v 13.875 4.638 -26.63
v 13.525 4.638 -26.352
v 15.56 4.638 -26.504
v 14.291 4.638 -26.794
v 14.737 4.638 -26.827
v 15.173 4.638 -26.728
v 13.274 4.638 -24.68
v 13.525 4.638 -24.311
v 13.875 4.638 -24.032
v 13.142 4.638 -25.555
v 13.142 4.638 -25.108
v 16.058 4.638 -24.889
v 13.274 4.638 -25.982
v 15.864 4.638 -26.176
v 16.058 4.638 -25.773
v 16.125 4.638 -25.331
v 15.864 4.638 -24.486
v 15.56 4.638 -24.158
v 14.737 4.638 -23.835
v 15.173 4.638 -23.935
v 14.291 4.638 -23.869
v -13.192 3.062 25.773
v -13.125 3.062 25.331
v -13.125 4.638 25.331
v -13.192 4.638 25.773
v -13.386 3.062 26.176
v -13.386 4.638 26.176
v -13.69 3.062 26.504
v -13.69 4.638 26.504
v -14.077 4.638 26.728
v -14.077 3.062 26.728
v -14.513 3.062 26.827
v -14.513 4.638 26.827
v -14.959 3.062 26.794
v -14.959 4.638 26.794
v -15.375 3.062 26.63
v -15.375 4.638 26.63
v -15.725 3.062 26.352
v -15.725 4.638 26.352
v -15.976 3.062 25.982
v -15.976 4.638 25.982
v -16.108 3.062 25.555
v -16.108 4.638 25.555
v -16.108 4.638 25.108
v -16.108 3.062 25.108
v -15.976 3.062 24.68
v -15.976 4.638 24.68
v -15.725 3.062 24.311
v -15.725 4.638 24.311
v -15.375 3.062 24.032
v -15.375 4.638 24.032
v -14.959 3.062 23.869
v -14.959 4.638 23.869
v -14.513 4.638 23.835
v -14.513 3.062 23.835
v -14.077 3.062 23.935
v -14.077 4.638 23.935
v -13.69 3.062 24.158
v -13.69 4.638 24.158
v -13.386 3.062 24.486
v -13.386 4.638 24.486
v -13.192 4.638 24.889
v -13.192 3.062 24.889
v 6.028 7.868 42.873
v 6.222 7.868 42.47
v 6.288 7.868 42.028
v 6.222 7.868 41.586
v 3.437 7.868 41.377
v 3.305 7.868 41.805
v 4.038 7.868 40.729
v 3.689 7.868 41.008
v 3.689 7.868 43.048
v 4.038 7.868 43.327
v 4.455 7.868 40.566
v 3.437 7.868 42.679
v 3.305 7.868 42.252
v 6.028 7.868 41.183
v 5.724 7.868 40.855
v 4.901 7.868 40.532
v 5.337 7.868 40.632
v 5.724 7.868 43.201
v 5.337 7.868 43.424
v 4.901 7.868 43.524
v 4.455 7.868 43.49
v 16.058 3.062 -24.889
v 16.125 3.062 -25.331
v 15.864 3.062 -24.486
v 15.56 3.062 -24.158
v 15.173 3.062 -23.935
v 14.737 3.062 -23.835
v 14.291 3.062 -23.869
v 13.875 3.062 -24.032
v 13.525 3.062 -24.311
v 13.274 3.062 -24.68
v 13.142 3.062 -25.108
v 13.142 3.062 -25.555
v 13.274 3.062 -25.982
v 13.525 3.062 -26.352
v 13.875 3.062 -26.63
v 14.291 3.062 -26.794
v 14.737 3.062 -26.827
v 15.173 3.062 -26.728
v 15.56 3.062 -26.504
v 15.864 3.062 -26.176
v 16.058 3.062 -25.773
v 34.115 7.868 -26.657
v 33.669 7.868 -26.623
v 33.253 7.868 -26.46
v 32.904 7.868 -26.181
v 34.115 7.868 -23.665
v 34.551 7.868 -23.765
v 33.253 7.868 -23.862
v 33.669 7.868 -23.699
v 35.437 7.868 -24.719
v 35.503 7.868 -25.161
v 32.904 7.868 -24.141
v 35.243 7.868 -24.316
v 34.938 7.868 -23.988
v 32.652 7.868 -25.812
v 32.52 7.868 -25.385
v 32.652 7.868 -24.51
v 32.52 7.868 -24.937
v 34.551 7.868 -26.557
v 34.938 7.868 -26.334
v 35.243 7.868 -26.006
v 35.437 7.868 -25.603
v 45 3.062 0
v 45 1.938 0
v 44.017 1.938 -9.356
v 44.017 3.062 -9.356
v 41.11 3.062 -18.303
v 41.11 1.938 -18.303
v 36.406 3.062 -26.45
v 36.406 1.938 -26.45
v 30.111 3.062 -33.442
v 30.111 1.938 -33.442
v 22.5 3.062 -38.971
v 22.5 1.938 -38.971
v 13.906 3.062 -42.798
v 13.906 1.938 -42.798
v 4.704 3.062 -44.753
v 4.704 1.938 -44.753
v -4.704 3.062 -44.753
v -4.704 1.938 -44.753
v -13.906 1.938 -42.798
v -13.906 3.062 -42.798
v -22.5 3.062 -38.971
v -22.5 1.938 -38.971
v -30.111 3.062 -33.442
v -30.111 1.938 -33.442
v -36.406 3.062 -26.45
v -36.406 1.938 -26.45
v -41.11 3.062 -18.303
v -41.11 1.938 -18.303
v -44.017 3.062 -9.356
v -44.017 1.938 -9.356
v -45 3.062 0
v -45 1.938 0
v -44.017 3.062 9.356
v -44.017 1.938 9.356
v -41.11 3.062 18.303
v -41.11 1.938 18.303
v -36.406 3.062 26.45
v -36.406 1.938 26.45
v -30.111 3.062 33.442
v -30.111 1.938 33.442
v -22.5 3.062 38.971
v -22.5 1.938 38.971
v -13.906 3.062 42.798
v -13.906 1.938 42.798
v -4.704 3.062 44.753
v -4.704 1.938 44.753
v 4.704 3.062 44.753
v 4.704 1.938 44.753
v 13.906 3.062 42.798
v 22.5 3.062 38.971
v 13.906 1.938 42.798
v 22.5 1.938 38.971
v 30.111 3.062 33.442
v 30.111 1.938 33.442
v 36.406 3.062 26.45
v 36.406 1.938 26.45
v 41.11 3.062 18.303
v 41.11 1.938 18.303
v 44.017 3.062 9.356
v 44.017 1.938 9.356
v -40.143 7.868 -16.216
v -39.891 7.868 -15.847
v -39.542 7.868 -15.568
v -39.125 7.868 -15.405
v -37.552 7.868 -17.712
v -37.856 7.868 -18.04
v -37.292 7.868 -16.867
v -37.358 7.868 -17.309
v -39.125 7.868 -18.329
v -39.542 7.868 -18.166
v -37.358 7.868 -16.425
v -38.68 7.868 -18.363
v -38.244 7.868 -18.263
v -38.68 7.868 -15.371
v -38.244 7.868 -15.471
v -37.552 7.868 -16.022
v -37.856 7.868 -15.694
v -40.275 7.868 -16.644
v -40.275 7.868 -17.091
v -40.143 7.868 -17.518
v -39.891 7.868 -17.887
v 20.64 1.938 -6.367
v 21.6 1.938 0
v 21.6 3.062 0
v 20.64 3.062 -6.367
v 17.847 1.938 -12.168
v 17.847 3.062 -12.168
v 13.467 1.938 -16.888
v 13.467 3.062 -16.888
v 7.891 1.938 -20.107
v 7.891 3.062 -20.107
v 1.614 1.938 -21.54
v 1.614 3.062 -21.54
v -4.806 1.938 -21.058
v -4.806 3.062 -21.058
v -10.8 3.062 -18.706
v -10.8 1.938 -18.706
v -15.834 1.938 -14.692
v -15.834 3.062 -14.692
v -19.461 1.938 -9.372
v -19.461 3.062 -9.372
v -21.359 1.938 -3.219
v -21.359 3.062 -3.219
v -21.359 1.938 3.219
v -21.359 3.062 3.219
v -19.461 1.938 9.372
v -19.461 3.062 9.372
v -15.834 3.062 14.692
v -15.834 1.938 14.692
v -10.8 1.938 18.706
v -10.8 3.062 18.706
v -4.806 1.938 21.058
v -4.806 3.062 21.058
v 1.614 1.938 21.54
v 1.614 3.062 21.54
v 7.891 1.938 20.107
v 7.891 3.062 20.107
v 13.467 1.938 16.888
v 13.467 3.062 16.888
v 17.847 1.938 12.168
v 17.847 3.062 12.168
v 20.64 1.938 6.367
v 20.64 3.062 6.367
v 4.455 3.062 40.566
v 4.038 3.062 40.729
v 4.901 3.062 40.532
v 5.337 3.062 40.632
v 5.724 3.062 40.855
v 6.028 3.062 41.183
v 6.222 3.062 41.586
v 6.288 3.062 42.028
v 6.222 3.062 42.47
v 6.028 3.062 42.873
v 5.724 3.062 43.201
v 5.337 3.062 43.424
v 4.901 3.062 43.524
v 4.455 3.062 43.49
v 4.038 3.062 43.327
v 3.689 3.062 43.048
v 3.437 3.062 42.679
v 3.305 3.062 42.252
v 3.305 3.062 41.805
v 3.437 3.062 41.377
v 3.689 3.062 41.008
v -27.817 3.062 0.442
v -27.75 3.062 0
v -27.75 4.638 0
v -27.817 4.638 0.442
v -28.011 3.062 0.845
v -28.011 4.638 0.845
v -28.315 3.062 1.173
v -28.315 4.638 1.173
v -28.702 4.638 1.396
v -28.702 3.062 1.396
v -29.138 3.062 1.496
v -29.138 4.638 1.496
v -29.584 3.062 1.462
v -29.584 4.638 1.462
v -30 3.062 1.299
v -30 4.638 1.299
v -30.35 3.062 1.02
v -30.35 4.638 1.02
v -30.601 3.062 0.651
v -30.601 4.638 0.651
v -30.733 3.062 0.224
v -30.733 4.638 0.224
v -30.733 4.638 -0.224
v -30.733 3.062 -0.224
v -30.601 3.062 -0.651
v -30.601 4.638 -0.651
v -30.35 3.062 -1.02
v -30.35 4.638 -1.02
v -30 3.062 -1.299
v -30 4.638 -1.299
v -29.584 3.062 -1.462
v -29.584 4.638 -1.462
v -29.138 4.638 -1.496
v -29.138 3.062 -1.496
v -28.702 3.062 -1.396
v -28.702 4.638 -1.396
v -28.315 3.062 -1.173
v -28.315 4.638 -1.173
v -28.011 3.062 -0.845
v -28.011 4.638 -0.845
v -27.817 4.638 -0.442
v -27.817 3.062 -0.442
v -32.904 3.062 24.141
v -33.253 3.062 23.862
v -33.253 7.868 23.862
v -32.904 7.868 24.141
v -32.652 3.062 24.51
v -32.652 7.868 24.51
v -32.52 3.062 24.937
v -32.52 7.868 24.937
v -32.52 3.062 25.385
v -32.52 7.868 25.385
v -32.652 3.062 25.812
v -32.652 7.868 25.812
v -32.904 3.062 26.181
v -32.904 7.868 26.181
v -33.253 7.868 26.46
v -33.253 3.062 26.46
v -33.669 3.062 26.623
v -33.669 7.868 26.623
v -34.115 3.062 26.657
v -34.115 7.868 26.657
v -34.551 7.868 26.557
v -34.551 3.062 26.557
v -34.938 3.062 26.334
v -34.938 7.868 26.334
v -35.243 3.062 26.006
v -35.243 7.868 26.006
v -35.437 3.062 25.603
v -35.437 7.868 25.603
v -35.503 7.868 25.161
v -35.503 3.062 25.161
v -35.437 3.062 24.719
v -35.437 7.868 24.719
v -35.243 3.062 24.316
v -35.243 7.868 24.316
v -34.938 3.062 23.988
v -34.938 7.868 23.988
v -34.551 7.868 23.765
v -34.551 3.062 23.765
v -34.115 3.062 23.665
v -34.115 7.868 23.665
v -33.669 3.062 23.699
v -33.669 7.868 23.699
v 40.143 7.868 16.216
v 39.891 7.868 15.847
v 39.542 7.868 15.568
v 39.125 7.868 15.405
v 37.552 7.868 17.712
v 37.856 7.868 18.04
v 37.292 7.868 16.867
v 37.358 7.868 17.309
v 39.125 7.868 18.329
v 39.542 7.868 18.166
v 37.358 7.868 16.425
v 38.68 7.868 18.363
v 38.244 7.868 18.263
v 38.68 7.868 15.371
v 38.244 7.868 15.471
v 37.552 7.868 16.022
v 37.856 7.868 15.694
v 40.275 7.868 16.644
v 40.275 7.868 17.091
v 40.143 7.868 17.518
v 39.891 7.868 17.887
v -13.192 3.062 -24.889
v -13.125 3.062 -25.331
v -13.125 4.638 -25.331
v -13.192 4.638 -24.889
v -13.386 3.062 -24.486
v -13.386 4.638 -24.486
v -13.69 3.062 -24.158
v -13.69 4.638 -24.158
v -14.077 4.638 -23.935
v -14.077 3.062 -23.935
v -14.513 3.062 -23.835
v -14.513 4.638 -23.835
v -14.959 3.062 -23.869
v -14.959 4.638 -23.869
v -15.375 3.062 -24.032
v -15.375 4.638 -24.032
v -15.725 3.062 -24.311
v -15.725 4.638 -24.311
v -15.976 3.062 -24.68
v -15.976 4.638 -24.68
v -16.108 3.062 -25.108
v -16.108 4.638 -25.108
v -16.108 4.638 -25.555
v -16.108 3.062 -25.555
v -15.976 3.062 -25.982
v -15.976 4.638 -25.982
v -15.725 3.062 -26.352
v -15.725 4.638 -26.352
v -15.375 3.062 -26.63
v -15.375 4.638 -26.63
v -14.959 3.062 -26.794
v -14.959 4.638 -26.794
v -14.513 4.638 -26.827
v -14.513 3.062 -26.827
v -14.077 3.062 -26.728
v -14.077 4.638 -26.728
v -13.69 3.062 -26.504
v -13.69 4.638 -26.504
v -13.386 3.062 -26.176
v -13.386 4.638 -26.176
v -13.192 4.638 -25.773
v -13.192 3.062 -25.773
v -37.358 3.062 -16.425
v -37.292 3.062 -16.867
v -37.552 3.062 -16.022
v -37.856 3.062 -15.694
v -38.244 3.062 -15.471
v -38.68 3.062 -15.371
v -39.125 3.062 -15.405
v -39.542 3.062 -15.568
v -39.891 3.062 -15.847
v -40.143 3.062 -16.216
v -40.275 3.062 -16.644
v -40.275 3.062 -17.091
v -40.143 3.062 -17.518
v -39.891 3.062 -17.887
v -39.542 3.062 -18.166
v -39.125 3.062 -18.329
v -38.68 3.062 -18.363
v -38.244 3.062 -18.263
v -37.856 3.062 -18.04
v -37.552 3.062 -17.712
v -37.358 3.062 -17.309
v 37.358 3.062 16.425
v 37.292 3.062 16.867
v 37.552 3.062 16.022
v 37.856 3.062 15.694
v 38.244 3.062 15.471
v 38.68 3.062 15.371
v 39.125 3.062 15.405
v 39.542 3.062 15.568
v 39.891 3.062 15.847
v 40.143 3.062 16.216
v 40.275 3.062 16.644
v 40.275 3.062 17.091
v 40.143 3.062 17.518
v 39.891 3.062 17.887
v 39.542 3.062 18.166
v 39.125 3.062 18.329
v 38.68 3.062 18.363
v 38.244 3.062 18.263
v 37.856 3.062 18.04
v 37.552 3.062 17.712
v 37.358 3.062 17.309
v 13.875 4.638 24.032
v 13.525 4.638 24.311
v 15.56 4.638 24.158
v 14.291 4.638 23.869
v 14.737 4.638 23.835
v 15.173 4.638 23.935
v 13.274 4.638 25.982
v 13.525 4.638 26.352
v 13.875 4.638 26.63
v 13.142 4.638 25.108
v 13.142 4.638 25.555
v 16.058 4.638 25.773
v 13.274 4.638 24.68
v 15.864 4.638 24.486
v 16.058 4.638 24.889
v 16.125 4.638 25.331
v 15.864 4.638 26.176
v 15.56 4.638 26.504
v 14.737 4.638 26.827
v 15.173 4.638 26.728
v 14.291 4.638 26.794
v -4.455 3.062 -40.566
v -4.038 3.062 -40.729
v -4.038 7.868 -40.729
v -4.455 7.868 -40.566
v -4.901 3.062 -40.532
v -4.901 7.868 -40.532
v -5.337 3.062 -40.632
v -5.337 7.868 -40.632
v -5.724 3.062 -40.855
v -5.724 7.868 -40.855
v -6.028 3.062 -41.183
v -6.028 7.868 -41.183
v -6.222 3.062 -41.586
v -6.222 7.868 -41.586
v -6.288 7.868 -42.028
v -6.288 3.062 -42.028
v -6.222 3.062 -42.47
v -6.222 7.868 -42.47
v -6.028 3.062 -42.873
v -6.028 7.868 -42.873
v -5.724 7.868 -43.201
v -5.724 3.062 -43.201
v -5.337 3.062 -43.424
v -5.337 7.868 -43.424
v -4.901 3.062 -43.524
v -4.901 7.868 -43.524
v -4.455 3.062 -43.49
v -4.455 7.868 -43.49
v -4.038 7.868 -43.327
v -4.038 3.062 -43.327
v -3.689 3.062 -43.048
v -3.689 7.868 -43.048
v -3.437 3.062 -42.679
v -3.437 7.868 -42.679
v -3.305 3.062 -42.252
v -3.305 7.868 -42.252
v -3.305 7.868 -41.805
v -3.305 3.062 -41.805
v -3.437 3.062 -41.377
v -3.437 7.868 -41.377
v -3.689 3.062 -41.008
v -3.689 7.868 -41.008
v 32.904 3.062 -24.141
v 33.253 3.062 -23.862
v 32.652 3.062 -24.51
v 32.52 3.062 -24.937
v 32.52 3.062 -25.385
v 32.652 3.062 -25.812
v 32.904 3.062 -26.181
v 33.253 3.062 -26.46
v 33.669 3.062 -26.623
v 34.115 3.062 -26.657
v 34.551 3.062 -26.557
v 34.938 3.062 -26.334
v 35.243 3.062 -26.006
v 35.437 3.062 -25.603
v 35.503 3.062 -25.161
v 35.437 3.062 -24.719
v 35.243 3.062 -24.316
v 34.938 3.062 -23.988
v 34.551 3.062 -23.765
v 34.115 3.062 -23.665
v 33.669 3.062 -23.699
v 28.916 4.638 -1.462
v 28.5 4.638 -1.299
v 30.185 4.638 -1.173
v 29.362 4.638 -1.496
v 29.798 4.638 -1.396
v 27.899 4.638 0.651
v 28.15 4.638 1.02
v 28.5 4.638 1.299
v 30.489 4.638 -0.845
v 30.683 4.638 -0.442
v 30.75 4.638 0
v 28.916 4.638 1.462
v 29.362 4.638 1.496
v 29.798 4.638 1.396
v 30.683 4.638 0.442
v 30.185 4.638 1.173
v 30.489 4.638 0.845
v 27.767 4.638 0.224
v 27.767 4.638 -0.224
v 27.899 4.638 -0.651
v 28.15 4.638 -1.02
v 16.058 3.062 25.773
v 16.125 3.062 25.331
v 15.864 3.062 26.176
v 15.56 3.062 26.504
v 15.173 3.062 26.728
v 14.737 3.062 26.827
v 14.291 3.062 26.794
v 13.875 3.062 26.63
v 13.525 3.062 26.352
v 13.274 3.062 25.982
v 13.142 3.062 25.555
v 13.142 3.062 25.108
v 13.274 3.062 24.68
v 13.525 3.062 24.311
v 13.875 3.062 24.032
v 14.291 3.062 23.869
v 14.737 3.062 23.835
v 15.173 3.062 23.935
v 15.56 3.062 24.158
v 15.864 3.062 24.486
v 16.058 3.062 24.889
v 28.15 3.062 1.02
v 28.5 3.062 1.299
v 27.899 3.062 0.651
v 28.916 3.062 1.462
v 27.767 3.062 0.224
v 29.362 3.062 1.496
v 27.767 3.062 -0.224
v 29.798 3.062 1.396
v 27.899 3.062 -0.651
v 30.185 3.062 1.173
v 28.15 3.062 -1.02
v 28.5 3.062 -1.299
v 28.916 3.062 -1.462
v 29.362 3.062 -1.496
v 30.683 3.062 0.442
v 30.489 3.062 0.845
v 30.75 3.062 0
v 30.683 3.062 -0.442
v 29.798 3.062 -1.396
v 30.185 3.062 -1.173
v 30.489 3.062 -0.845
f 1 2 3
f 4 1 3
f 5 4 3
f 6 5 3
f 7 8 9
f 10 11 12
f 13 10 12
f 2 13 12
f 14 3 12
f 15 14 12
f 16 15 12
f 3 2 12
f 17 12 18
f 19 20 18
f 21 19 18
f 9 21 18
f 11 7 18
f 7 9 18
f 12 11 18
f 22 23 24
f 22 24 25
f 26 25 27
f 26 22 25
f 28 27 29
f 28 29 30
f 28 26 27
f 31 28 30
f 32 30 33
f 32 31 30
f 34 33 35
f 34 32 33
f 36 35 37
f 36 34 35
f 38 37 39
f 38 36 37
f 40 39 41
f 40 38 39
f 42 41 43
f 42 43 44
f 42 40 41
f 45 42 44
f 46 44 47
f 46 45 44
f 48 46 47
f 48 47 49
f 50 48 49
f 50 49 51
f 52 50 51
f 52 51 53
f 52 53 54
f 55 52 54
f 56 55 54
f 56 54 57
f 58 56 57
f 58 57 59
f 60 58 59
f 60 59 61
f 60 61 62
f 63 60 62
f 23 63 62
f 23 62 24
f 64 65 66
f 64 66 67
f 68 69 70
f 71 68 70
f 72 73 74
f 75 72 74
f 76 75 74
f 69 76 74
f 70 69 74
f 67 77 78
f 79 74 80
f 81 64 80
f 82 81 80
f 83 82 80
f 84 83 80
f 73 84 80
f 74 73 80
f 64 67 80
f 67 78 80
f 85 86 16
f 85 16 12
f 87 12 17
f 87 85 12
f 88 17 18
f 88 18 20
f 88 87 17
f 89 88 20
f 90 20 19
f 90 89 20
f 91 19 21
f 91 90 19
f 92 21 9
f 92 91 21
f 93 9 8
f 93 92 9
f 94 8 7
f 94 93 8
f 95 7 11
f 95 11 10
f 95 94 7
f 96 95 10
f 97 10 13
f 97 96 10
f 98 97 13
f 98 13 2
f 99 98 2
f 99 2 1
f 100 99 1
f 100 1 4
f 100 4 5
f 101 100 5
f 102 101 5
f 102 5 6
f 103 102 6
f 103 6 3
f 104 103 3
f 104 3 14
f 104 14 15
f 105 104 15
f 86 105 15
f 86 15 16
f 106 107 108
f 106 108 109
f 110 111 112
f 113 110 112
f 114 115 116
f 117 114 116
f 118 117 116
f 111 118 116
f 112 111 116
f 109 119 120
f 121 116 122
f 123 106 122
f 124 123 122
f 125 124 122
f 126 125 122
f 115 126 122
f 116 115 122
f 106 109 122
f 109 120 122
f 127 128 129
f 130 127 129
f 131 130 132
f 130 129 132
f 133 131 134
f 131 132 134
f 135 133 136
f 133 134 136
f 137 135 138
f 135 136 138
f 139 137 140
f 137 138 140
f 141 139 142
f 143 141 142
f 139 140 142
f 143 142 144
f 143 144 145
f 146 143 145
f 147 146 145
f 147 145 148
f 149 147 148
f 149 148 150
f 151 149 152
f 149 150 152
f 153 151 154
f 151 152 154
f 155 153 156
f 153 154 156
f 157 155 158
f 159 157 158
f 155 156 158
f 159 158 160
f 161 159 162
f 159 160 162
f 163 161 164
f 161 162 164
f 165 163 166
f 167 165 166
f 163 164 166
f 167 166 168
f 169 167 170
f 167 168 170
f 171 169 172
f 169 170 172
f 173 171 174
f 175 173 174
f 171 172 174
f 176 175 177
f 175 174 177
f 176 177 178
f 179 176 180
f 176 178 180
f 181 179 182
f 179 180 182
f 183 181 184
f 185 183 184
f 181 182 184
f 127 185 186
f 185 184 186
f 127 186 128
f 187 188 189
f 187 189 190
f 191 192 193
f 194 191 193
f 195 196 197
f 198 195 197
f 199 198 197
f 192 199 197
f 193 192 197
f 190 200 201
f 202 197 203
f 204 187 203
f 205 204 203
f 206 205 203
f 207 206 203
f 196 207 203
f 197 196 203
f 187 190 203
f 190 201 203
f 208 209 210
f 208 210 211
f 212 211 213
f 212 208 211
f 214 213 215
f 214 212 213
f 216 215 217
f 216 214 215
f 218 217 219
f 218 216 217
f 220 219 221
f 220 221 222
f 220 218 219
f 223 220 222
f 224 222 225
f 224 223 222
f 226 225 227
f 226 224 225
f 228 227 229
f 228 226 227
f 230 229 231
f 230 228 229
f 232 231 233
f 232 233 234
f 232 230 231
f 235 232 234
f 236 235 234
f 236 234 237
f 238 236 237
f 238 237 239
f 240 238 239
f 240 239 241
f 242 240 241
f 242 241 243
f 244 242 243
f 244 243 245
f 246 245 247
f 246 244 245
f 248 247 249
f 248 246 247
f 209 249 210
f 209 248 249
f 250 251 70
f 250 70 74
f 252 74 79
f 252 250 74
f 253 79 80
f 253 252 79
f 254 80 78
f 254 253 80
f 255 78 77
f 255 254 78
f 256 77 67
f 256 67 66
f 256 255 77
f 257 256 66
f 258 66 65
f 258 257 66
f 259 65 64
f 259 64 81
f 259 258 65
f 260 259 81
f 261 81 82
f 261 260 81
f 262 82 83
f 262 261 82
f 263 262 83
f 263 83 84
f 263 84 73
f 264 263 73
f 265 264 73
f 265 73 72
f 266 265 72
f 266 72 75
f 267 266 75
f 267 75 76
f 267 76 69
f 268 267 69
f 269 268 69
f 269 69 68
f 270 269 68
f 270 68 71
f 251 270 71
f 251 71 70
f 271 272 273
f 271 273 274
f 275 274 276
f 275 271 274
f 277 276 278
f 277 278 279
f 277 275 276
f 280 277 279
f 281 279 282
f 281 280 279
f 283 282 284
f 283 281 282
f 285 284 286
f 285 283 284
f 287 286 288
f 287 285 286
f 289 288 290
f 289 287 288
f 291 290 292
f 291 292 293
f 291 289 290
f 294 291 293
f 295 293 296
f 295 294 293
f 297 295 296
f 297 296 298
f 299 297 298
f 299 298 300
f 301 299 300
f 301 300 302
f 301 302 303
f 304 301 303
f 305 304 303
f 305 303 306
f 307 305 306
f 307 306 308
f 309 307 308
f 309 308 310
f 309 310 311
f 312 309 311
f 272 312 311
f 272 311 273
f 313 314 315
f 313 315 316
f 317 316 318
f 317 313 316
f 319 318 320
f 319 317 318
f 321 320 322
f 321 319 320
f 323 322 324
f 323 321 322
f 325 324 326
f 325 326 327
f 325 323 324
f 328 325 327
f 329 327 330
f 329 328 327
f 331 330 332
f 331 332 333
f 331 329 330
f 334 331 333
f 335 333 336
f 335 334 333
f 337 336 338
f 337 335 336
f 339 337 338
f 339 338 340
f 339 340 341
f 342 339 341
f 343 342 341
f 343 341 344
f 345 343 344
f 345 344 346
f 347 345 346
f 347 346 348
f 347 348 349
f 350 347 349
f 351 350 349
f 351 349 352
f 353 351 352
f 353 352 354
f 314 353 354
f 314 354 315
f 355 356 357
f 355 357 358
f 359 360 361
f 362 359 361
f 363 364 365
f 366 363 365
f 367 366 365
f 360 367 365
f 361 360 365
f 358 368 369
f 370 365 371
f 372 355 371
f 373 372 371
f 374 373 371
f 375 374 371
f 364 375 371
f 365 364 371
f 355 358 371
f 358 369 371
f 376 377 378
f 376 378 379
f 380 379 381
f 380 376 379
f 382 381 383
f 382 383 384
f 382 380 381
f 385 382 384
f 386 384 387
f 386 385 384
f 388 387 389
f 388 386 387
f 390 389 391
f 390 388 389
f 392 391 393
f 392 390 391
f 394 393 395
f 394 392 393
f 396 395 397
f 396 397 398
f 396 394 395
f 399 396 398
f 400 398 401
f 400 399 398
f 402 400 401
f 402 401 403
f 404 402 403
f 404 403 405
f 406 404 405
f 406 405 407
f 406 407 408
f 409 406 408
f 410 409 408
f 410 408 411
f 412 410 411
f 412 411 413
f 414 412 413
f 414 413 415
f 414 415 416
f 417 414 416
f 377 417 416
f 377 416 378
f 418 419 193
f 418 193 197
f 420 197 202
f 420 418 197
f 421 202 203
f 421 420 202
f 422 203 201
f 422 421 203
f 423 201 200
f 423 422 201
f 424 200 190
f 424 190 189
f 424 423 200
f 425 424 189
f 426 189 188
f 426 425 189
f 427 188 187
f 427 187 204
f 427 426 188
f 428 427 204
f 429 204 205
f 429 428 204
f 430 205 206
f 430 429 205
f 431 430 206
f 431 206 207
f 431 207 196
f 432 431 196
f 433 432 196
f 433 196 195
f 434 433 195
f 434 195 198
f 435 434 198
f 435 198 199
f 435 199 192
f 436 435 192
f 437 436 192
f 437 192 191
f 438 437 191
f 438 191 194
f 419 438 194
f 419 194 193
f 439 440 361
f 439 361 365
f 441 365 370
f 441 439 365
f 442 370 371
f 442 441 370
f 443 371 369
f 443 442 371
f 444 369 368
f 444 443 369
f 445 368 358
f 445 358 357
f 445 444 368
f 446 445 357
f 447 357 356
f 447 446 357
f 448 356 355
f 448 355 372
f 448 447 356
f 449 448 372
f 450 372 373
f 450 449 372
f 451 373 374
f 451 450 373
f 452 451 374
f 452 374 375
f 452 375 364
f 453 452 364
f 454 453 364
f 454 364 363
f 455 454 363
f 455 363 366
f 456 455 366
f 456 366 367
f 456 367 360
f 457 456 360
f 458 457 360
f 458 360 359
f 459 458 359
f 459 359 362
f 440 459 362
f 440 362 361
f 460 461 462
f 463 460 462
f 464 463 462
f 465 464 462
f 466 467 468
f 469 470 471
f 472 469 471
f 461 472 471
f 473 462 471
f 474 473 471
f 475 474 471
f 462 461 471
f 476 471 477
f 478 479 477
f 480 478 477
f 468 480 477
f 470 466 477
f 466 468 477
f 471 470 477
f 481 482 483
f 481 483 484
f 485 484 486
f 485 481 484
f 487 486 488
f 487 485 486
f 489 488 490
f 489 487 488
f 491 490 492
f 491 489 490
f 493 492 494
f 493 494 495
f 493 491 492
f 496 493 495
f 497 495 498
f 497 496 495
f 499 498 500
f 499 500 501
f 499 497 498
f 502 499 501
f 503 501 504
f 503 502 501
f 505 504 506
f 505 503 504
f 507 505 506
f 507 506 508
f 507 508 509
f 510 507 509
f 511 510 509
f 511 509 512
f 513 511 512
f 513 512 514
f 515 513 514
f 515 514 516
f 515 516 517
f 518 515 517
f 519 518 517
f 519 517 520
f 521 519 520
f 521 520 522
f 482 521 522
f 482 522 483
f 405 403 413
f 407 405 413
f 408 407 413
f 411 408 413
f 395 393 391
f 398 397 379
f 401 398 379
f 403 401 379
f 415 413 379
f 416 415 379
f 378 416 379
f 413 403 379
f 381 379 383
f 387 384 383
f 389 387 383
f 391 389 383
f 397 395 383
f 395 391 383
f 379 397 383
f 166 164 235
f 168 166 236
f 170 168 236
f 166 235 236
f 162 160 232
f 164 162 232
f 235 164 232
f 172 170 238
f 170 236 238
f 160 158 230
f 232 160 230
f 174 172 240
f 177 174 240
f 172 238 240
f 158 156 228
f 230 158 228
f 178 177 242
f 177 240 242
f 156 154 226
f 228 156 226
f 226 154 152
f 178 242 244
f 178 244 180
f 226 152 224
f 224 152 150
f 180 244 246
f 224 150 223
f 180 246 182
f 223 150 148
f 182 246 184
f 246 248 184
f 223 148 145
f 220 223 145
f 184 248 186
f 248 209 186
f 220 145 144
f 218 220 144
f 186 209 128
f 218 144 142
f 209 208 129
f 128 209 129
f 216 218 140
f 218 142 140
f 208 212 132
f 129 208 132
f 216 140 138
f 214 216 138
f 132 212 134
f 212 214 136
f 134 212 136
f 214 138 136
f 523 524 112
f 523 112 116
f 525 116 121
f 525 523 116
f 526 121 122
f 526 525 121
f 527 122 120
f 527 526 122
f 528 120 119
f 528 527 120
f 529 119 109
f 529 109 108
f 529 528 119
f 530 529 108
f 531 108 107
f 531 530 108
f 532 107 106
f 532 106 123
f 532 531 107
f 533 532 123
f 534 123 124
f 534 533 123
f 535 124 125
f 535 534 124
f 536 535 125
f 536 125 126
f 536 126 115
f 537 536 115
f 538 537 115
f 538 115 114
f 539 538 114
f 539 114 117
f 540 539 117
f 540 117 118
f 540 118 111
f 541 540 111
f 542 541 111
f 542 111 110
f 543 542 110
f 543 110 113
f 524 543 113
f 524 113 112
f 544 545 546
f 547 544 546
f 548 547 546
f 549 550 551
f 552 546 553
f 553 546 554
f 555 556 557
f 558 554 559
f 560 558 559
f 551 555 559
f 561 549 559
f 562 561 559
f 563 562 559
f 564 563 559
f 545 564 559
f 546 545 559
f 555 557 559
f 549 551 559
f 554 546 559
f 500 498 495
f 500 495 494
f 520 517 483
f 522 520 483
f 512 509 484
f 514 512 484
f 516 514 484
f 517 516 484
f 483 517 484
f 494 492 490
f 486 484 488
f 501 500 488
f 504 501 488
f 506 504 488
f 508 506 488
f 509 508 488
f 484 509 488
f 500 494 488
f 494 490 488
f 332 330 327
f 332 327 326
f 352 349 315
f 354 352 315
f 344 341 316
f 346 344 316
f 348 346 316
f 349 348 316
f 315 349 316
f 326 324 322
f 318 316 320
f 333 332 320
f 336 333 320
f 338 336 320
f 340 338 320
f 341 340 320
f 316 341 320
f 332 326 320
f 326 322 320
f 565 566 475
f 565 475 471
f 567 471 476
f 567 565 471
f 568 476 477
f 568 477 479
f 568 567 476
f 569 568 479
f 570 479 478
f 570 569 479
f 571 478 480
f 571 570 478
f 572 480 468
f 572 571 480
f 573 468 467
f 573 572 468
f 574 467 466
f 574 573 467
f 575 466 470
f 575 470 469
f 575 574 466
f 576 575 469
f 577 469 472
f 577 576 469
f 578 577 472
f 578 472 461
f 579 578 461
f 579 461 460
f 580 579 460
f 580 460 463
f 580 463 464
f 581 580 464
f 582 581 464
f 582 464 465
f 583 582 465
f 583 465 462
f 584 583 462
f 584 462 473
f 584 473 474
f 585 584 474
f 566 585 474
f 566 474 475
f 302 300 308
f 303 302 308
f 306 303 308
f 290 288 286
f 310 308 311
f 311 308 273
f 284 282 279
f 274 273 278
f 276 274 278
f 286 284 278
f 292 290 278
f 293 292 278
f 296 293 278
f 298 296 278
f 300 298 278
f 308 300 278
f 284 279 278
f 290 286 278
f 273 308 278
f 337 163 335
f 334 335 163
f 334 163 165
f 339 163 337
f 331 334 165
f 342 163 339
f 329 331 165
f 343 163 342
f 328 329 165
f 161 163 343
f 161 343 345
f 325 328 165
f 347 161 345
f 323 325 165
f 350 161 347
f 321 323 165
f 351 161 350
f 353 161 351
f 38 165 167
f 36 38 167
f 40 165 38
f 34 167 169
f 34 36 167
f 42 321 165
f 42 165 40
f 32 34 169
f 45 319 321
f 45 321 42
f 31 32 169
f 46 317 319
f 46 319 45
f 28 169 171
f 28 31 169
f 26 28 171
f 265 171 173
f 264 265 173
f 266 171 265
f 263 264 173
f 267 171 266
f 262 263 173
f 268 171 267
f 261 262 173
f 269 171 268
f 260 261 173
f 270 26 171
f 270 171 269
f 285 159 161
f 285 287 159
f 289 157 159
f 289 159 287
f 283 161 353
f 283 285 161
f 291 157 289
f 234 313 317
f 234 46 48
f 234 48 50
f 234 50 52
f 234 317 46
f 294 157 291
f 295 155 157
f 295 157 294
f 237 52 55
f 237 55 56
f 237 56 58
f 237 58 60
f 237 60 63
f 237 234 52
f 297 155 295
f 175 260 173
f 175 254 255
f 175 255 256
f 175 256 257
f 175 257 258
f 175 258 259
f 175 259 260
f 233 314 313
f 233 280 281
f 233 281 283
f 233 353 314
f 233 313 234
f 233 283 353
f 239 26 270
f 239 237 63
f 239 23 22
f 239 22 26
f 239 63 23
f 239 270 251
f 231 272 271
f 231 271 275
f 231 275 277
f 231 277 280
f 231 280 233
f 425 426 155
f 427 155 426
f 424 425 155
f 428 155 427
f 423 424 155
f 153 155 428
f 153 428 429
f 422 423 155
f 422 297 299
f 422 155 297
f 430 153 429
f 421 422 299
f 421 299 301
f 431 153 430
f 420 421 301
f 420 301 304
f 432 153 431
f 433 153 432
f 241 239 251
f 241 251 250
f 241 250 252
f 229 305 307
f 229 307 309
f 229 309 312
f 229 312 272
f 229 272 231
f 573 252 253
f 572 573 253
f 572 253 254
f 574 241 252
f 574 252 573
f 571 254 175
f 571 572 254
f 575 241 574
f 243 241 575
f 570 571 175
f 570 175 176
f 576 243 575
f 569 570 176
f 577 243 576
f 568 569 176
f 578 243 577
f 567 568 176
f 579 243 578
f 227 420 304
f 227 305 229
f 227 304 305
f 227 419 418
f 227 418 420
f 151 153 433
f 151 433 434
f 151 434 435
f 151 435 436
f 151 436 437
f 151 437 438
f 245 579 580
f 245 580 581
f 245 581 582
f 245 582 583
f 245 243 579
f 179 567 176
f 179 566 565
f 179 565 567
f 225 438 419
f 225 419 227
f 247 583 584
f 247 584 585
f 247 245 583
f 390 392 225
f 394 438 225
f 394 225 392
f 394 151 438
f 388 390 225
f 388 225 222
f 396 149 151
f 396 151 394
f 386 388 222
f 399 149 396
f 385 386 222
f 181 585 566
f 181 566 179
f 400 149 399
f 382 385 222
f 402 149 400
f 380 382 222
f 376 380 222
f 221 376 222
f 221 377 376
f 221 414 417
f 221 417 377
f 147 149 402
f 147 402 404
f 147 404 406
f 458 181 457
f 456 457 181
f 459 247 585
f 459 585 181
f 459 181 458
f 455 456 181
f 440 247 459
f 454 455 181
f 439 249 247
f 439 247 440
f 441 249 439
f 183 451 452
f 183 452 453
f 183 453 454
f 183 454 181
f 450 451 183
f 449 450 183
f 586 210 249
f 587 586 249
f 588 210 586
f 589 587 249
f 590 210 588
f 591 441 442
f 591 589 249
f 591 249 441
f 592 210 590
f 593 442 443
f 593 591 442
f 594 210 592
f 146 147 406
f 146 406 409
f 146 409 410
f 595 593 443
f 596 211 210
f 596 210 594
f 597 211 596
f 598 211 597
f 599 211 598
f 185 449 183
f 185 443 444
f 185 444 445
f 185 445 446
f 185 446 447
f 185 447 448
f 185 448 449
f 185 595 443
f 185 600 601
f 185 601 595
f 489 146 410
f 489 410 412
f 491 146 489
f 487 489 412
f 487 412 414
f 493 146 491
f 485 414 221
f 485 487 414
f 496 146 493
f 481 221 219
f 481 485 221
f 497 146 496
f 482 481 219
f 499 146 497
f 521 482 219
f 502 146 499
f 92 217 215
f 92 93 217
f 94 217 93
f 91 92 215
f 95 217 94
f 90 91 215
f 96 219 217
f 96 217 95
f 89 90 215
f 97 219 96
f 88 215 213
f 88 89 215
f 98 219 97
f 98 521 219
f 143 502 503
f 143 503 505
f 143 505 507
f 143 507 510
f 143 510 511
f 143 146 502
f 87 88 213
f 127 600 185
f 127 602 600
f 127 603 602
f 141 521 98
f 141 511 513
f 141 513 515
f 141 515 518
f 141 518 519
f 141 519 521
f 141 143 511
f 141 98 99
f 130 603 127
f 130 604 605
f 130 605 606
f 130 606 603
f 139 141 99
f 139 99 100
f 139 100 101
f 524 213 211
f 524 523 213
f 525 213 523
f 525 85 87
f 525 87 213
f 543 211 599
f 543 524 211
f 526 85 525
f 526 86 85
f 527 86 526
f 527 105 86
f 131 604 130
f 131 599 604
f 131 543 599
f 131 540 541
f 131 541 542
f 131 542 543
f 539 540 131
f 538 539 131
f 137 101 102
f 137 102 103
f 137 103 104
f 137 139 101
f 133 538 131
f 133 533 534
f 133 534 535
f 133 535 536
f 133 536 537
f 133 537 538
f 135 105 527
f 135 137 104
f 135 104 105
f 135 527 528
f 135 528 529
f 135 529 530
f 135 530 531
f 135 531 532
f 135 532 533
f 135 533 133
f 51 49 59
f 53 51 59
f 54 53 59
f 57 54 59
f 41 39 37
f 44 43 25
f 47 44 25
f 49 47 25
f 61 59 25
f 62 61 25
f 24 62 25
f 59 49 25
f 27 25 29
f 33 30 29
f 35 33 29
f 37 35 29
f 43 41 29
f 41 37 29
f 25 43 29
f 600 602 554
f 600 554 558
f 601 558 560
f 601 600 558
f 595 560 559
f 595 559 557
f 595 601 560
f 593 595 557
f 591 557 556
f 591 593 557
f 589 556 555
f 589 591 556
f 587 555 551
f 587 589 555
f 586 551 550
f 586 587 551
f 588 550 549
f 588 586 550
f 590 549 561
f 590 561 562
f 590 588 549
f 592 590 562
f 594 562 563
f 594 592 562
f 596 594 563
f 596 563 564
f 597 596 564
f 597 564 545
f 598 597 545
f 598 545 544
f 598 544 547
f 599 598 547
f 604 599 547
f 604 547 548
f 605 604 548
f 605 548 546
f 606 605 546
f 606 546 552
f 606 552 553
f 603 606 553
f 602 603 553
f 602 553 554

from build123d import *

# Parameters (mm, degrees)
SKETCH1_R           = 200
SKETCH1_R_2         = 96
BOSS_EXTRUDE1_DEPTH = 5
SKETCH2_R           = 3.5
SKETCH2_R_2         = 2
CUT_EXTRUDE1_DEPTH  = 5
CIRPATTERN1_COUNT   = 6
SCALE2_SCALE        = 0.225
SKETCH3_R           = 1.5
BOSS_EXTRUDE2_DEPTH = 5.93
SKETCH4_R           = 1.5
BOSS_EXTRUDE3_DEPTH = 2.7
CIRPATTERN2_COUNT   = 6


with BuildPart() as part:
    # Sketch1 → Boss-Extrude1 (new body)
    with BuildSketch(Plane(origin=(0, 0, 0), x_dir=(1, 0, 0), z_dir=(0, 1, 0))):
        Circle(SKETCH1_R)
        Circle(SKETCH1_R_2, mode=Mode.SUBTRACT)
    extrude(amount=BOSS_EXTRUDE1_DEPTH)

    # Sketch2 → Cut-Extrude1 (cut)
    with BuildSketch(Plane(origin=(0, 5, 0), x_dir=(1, 0, 0), z_dir=(0, 1, 0))):
        with Locations((151.125089796, 111.826683909)):
            Circle(SKETCH2_R)
        with Locations((130, 0)):
            Circle(SKETCH2_R_2)
    cut_extrude1 = extrude(amount=-CUT_EXTRUDE1_DEPTH, mode=Mode.SUBTRACT)

    # CirPattern1: Cut-Extrude1 ×6 about axis
    cirpattern1_axis = Axis((0, 0, 0), (0, 1, 0))
    for i in range(1, CIRPATTERN1_COUNT):
        add(cut_extrude1.rotate(cirpattern1_axis, i * 360 / CIRPATTERN1_COUNT), mode=Mode.SUBTRACT)


with BuildPart() as part_1:
    # Scale2: scaled about (0, 2.5, 0)
    add(part.part.scale(SCALE2_SCALE).moved(Location((0, 1.9375, 0))))

    # Sketch3 → Boss-Extrude2 (add)
    with BuildSketch(Plane.XZ.offset(-1.9375)):
        with Locations((-38.791641146, -16.867085616)):
            Circle(SKETCH3_R)
    boss_extrude2 = extrude(amount=-BOSS_EXTRUDE2_DEPTH)

    # Sketch4 → Boss-Extrude3 (add)
    with BuildSketch(Plane.XZ.offset(-1.9375)):
        with Locations((-14.625, 25.331243061)):
            Circle(SKETCH4_R)
        with Locations((14.625, 25.331243061)):
            Circle(SKETCH4_R)
        with Locations((29.25, 0)):
            Circle(SKETCH4_R)
        with Locations((14.625, -25.331243061)):
            Circle(SKETCH4_R)
        with Locations((-14.625, -25.331243061)):
            Circle(SKETCH4_R)
        with Locations((-29.25, 0)):
            Circle(SKETCH4_R)
    extrude(amount=-BOSS_EXTRUDE3_DEPTH)

    # CirPattern2: Boss-Extrude2 ×6 about axis
    cirpattern2_axis = Axis((0, 0, 0), (0, 1, 0))
    for i in range(1, CIRPATTERN2_COUNT):
        add(boss_extrude2.rotate(cirpattern2_axis, i * 360 / CIRPATTERN2_COUNT))


solid = part_1.part
